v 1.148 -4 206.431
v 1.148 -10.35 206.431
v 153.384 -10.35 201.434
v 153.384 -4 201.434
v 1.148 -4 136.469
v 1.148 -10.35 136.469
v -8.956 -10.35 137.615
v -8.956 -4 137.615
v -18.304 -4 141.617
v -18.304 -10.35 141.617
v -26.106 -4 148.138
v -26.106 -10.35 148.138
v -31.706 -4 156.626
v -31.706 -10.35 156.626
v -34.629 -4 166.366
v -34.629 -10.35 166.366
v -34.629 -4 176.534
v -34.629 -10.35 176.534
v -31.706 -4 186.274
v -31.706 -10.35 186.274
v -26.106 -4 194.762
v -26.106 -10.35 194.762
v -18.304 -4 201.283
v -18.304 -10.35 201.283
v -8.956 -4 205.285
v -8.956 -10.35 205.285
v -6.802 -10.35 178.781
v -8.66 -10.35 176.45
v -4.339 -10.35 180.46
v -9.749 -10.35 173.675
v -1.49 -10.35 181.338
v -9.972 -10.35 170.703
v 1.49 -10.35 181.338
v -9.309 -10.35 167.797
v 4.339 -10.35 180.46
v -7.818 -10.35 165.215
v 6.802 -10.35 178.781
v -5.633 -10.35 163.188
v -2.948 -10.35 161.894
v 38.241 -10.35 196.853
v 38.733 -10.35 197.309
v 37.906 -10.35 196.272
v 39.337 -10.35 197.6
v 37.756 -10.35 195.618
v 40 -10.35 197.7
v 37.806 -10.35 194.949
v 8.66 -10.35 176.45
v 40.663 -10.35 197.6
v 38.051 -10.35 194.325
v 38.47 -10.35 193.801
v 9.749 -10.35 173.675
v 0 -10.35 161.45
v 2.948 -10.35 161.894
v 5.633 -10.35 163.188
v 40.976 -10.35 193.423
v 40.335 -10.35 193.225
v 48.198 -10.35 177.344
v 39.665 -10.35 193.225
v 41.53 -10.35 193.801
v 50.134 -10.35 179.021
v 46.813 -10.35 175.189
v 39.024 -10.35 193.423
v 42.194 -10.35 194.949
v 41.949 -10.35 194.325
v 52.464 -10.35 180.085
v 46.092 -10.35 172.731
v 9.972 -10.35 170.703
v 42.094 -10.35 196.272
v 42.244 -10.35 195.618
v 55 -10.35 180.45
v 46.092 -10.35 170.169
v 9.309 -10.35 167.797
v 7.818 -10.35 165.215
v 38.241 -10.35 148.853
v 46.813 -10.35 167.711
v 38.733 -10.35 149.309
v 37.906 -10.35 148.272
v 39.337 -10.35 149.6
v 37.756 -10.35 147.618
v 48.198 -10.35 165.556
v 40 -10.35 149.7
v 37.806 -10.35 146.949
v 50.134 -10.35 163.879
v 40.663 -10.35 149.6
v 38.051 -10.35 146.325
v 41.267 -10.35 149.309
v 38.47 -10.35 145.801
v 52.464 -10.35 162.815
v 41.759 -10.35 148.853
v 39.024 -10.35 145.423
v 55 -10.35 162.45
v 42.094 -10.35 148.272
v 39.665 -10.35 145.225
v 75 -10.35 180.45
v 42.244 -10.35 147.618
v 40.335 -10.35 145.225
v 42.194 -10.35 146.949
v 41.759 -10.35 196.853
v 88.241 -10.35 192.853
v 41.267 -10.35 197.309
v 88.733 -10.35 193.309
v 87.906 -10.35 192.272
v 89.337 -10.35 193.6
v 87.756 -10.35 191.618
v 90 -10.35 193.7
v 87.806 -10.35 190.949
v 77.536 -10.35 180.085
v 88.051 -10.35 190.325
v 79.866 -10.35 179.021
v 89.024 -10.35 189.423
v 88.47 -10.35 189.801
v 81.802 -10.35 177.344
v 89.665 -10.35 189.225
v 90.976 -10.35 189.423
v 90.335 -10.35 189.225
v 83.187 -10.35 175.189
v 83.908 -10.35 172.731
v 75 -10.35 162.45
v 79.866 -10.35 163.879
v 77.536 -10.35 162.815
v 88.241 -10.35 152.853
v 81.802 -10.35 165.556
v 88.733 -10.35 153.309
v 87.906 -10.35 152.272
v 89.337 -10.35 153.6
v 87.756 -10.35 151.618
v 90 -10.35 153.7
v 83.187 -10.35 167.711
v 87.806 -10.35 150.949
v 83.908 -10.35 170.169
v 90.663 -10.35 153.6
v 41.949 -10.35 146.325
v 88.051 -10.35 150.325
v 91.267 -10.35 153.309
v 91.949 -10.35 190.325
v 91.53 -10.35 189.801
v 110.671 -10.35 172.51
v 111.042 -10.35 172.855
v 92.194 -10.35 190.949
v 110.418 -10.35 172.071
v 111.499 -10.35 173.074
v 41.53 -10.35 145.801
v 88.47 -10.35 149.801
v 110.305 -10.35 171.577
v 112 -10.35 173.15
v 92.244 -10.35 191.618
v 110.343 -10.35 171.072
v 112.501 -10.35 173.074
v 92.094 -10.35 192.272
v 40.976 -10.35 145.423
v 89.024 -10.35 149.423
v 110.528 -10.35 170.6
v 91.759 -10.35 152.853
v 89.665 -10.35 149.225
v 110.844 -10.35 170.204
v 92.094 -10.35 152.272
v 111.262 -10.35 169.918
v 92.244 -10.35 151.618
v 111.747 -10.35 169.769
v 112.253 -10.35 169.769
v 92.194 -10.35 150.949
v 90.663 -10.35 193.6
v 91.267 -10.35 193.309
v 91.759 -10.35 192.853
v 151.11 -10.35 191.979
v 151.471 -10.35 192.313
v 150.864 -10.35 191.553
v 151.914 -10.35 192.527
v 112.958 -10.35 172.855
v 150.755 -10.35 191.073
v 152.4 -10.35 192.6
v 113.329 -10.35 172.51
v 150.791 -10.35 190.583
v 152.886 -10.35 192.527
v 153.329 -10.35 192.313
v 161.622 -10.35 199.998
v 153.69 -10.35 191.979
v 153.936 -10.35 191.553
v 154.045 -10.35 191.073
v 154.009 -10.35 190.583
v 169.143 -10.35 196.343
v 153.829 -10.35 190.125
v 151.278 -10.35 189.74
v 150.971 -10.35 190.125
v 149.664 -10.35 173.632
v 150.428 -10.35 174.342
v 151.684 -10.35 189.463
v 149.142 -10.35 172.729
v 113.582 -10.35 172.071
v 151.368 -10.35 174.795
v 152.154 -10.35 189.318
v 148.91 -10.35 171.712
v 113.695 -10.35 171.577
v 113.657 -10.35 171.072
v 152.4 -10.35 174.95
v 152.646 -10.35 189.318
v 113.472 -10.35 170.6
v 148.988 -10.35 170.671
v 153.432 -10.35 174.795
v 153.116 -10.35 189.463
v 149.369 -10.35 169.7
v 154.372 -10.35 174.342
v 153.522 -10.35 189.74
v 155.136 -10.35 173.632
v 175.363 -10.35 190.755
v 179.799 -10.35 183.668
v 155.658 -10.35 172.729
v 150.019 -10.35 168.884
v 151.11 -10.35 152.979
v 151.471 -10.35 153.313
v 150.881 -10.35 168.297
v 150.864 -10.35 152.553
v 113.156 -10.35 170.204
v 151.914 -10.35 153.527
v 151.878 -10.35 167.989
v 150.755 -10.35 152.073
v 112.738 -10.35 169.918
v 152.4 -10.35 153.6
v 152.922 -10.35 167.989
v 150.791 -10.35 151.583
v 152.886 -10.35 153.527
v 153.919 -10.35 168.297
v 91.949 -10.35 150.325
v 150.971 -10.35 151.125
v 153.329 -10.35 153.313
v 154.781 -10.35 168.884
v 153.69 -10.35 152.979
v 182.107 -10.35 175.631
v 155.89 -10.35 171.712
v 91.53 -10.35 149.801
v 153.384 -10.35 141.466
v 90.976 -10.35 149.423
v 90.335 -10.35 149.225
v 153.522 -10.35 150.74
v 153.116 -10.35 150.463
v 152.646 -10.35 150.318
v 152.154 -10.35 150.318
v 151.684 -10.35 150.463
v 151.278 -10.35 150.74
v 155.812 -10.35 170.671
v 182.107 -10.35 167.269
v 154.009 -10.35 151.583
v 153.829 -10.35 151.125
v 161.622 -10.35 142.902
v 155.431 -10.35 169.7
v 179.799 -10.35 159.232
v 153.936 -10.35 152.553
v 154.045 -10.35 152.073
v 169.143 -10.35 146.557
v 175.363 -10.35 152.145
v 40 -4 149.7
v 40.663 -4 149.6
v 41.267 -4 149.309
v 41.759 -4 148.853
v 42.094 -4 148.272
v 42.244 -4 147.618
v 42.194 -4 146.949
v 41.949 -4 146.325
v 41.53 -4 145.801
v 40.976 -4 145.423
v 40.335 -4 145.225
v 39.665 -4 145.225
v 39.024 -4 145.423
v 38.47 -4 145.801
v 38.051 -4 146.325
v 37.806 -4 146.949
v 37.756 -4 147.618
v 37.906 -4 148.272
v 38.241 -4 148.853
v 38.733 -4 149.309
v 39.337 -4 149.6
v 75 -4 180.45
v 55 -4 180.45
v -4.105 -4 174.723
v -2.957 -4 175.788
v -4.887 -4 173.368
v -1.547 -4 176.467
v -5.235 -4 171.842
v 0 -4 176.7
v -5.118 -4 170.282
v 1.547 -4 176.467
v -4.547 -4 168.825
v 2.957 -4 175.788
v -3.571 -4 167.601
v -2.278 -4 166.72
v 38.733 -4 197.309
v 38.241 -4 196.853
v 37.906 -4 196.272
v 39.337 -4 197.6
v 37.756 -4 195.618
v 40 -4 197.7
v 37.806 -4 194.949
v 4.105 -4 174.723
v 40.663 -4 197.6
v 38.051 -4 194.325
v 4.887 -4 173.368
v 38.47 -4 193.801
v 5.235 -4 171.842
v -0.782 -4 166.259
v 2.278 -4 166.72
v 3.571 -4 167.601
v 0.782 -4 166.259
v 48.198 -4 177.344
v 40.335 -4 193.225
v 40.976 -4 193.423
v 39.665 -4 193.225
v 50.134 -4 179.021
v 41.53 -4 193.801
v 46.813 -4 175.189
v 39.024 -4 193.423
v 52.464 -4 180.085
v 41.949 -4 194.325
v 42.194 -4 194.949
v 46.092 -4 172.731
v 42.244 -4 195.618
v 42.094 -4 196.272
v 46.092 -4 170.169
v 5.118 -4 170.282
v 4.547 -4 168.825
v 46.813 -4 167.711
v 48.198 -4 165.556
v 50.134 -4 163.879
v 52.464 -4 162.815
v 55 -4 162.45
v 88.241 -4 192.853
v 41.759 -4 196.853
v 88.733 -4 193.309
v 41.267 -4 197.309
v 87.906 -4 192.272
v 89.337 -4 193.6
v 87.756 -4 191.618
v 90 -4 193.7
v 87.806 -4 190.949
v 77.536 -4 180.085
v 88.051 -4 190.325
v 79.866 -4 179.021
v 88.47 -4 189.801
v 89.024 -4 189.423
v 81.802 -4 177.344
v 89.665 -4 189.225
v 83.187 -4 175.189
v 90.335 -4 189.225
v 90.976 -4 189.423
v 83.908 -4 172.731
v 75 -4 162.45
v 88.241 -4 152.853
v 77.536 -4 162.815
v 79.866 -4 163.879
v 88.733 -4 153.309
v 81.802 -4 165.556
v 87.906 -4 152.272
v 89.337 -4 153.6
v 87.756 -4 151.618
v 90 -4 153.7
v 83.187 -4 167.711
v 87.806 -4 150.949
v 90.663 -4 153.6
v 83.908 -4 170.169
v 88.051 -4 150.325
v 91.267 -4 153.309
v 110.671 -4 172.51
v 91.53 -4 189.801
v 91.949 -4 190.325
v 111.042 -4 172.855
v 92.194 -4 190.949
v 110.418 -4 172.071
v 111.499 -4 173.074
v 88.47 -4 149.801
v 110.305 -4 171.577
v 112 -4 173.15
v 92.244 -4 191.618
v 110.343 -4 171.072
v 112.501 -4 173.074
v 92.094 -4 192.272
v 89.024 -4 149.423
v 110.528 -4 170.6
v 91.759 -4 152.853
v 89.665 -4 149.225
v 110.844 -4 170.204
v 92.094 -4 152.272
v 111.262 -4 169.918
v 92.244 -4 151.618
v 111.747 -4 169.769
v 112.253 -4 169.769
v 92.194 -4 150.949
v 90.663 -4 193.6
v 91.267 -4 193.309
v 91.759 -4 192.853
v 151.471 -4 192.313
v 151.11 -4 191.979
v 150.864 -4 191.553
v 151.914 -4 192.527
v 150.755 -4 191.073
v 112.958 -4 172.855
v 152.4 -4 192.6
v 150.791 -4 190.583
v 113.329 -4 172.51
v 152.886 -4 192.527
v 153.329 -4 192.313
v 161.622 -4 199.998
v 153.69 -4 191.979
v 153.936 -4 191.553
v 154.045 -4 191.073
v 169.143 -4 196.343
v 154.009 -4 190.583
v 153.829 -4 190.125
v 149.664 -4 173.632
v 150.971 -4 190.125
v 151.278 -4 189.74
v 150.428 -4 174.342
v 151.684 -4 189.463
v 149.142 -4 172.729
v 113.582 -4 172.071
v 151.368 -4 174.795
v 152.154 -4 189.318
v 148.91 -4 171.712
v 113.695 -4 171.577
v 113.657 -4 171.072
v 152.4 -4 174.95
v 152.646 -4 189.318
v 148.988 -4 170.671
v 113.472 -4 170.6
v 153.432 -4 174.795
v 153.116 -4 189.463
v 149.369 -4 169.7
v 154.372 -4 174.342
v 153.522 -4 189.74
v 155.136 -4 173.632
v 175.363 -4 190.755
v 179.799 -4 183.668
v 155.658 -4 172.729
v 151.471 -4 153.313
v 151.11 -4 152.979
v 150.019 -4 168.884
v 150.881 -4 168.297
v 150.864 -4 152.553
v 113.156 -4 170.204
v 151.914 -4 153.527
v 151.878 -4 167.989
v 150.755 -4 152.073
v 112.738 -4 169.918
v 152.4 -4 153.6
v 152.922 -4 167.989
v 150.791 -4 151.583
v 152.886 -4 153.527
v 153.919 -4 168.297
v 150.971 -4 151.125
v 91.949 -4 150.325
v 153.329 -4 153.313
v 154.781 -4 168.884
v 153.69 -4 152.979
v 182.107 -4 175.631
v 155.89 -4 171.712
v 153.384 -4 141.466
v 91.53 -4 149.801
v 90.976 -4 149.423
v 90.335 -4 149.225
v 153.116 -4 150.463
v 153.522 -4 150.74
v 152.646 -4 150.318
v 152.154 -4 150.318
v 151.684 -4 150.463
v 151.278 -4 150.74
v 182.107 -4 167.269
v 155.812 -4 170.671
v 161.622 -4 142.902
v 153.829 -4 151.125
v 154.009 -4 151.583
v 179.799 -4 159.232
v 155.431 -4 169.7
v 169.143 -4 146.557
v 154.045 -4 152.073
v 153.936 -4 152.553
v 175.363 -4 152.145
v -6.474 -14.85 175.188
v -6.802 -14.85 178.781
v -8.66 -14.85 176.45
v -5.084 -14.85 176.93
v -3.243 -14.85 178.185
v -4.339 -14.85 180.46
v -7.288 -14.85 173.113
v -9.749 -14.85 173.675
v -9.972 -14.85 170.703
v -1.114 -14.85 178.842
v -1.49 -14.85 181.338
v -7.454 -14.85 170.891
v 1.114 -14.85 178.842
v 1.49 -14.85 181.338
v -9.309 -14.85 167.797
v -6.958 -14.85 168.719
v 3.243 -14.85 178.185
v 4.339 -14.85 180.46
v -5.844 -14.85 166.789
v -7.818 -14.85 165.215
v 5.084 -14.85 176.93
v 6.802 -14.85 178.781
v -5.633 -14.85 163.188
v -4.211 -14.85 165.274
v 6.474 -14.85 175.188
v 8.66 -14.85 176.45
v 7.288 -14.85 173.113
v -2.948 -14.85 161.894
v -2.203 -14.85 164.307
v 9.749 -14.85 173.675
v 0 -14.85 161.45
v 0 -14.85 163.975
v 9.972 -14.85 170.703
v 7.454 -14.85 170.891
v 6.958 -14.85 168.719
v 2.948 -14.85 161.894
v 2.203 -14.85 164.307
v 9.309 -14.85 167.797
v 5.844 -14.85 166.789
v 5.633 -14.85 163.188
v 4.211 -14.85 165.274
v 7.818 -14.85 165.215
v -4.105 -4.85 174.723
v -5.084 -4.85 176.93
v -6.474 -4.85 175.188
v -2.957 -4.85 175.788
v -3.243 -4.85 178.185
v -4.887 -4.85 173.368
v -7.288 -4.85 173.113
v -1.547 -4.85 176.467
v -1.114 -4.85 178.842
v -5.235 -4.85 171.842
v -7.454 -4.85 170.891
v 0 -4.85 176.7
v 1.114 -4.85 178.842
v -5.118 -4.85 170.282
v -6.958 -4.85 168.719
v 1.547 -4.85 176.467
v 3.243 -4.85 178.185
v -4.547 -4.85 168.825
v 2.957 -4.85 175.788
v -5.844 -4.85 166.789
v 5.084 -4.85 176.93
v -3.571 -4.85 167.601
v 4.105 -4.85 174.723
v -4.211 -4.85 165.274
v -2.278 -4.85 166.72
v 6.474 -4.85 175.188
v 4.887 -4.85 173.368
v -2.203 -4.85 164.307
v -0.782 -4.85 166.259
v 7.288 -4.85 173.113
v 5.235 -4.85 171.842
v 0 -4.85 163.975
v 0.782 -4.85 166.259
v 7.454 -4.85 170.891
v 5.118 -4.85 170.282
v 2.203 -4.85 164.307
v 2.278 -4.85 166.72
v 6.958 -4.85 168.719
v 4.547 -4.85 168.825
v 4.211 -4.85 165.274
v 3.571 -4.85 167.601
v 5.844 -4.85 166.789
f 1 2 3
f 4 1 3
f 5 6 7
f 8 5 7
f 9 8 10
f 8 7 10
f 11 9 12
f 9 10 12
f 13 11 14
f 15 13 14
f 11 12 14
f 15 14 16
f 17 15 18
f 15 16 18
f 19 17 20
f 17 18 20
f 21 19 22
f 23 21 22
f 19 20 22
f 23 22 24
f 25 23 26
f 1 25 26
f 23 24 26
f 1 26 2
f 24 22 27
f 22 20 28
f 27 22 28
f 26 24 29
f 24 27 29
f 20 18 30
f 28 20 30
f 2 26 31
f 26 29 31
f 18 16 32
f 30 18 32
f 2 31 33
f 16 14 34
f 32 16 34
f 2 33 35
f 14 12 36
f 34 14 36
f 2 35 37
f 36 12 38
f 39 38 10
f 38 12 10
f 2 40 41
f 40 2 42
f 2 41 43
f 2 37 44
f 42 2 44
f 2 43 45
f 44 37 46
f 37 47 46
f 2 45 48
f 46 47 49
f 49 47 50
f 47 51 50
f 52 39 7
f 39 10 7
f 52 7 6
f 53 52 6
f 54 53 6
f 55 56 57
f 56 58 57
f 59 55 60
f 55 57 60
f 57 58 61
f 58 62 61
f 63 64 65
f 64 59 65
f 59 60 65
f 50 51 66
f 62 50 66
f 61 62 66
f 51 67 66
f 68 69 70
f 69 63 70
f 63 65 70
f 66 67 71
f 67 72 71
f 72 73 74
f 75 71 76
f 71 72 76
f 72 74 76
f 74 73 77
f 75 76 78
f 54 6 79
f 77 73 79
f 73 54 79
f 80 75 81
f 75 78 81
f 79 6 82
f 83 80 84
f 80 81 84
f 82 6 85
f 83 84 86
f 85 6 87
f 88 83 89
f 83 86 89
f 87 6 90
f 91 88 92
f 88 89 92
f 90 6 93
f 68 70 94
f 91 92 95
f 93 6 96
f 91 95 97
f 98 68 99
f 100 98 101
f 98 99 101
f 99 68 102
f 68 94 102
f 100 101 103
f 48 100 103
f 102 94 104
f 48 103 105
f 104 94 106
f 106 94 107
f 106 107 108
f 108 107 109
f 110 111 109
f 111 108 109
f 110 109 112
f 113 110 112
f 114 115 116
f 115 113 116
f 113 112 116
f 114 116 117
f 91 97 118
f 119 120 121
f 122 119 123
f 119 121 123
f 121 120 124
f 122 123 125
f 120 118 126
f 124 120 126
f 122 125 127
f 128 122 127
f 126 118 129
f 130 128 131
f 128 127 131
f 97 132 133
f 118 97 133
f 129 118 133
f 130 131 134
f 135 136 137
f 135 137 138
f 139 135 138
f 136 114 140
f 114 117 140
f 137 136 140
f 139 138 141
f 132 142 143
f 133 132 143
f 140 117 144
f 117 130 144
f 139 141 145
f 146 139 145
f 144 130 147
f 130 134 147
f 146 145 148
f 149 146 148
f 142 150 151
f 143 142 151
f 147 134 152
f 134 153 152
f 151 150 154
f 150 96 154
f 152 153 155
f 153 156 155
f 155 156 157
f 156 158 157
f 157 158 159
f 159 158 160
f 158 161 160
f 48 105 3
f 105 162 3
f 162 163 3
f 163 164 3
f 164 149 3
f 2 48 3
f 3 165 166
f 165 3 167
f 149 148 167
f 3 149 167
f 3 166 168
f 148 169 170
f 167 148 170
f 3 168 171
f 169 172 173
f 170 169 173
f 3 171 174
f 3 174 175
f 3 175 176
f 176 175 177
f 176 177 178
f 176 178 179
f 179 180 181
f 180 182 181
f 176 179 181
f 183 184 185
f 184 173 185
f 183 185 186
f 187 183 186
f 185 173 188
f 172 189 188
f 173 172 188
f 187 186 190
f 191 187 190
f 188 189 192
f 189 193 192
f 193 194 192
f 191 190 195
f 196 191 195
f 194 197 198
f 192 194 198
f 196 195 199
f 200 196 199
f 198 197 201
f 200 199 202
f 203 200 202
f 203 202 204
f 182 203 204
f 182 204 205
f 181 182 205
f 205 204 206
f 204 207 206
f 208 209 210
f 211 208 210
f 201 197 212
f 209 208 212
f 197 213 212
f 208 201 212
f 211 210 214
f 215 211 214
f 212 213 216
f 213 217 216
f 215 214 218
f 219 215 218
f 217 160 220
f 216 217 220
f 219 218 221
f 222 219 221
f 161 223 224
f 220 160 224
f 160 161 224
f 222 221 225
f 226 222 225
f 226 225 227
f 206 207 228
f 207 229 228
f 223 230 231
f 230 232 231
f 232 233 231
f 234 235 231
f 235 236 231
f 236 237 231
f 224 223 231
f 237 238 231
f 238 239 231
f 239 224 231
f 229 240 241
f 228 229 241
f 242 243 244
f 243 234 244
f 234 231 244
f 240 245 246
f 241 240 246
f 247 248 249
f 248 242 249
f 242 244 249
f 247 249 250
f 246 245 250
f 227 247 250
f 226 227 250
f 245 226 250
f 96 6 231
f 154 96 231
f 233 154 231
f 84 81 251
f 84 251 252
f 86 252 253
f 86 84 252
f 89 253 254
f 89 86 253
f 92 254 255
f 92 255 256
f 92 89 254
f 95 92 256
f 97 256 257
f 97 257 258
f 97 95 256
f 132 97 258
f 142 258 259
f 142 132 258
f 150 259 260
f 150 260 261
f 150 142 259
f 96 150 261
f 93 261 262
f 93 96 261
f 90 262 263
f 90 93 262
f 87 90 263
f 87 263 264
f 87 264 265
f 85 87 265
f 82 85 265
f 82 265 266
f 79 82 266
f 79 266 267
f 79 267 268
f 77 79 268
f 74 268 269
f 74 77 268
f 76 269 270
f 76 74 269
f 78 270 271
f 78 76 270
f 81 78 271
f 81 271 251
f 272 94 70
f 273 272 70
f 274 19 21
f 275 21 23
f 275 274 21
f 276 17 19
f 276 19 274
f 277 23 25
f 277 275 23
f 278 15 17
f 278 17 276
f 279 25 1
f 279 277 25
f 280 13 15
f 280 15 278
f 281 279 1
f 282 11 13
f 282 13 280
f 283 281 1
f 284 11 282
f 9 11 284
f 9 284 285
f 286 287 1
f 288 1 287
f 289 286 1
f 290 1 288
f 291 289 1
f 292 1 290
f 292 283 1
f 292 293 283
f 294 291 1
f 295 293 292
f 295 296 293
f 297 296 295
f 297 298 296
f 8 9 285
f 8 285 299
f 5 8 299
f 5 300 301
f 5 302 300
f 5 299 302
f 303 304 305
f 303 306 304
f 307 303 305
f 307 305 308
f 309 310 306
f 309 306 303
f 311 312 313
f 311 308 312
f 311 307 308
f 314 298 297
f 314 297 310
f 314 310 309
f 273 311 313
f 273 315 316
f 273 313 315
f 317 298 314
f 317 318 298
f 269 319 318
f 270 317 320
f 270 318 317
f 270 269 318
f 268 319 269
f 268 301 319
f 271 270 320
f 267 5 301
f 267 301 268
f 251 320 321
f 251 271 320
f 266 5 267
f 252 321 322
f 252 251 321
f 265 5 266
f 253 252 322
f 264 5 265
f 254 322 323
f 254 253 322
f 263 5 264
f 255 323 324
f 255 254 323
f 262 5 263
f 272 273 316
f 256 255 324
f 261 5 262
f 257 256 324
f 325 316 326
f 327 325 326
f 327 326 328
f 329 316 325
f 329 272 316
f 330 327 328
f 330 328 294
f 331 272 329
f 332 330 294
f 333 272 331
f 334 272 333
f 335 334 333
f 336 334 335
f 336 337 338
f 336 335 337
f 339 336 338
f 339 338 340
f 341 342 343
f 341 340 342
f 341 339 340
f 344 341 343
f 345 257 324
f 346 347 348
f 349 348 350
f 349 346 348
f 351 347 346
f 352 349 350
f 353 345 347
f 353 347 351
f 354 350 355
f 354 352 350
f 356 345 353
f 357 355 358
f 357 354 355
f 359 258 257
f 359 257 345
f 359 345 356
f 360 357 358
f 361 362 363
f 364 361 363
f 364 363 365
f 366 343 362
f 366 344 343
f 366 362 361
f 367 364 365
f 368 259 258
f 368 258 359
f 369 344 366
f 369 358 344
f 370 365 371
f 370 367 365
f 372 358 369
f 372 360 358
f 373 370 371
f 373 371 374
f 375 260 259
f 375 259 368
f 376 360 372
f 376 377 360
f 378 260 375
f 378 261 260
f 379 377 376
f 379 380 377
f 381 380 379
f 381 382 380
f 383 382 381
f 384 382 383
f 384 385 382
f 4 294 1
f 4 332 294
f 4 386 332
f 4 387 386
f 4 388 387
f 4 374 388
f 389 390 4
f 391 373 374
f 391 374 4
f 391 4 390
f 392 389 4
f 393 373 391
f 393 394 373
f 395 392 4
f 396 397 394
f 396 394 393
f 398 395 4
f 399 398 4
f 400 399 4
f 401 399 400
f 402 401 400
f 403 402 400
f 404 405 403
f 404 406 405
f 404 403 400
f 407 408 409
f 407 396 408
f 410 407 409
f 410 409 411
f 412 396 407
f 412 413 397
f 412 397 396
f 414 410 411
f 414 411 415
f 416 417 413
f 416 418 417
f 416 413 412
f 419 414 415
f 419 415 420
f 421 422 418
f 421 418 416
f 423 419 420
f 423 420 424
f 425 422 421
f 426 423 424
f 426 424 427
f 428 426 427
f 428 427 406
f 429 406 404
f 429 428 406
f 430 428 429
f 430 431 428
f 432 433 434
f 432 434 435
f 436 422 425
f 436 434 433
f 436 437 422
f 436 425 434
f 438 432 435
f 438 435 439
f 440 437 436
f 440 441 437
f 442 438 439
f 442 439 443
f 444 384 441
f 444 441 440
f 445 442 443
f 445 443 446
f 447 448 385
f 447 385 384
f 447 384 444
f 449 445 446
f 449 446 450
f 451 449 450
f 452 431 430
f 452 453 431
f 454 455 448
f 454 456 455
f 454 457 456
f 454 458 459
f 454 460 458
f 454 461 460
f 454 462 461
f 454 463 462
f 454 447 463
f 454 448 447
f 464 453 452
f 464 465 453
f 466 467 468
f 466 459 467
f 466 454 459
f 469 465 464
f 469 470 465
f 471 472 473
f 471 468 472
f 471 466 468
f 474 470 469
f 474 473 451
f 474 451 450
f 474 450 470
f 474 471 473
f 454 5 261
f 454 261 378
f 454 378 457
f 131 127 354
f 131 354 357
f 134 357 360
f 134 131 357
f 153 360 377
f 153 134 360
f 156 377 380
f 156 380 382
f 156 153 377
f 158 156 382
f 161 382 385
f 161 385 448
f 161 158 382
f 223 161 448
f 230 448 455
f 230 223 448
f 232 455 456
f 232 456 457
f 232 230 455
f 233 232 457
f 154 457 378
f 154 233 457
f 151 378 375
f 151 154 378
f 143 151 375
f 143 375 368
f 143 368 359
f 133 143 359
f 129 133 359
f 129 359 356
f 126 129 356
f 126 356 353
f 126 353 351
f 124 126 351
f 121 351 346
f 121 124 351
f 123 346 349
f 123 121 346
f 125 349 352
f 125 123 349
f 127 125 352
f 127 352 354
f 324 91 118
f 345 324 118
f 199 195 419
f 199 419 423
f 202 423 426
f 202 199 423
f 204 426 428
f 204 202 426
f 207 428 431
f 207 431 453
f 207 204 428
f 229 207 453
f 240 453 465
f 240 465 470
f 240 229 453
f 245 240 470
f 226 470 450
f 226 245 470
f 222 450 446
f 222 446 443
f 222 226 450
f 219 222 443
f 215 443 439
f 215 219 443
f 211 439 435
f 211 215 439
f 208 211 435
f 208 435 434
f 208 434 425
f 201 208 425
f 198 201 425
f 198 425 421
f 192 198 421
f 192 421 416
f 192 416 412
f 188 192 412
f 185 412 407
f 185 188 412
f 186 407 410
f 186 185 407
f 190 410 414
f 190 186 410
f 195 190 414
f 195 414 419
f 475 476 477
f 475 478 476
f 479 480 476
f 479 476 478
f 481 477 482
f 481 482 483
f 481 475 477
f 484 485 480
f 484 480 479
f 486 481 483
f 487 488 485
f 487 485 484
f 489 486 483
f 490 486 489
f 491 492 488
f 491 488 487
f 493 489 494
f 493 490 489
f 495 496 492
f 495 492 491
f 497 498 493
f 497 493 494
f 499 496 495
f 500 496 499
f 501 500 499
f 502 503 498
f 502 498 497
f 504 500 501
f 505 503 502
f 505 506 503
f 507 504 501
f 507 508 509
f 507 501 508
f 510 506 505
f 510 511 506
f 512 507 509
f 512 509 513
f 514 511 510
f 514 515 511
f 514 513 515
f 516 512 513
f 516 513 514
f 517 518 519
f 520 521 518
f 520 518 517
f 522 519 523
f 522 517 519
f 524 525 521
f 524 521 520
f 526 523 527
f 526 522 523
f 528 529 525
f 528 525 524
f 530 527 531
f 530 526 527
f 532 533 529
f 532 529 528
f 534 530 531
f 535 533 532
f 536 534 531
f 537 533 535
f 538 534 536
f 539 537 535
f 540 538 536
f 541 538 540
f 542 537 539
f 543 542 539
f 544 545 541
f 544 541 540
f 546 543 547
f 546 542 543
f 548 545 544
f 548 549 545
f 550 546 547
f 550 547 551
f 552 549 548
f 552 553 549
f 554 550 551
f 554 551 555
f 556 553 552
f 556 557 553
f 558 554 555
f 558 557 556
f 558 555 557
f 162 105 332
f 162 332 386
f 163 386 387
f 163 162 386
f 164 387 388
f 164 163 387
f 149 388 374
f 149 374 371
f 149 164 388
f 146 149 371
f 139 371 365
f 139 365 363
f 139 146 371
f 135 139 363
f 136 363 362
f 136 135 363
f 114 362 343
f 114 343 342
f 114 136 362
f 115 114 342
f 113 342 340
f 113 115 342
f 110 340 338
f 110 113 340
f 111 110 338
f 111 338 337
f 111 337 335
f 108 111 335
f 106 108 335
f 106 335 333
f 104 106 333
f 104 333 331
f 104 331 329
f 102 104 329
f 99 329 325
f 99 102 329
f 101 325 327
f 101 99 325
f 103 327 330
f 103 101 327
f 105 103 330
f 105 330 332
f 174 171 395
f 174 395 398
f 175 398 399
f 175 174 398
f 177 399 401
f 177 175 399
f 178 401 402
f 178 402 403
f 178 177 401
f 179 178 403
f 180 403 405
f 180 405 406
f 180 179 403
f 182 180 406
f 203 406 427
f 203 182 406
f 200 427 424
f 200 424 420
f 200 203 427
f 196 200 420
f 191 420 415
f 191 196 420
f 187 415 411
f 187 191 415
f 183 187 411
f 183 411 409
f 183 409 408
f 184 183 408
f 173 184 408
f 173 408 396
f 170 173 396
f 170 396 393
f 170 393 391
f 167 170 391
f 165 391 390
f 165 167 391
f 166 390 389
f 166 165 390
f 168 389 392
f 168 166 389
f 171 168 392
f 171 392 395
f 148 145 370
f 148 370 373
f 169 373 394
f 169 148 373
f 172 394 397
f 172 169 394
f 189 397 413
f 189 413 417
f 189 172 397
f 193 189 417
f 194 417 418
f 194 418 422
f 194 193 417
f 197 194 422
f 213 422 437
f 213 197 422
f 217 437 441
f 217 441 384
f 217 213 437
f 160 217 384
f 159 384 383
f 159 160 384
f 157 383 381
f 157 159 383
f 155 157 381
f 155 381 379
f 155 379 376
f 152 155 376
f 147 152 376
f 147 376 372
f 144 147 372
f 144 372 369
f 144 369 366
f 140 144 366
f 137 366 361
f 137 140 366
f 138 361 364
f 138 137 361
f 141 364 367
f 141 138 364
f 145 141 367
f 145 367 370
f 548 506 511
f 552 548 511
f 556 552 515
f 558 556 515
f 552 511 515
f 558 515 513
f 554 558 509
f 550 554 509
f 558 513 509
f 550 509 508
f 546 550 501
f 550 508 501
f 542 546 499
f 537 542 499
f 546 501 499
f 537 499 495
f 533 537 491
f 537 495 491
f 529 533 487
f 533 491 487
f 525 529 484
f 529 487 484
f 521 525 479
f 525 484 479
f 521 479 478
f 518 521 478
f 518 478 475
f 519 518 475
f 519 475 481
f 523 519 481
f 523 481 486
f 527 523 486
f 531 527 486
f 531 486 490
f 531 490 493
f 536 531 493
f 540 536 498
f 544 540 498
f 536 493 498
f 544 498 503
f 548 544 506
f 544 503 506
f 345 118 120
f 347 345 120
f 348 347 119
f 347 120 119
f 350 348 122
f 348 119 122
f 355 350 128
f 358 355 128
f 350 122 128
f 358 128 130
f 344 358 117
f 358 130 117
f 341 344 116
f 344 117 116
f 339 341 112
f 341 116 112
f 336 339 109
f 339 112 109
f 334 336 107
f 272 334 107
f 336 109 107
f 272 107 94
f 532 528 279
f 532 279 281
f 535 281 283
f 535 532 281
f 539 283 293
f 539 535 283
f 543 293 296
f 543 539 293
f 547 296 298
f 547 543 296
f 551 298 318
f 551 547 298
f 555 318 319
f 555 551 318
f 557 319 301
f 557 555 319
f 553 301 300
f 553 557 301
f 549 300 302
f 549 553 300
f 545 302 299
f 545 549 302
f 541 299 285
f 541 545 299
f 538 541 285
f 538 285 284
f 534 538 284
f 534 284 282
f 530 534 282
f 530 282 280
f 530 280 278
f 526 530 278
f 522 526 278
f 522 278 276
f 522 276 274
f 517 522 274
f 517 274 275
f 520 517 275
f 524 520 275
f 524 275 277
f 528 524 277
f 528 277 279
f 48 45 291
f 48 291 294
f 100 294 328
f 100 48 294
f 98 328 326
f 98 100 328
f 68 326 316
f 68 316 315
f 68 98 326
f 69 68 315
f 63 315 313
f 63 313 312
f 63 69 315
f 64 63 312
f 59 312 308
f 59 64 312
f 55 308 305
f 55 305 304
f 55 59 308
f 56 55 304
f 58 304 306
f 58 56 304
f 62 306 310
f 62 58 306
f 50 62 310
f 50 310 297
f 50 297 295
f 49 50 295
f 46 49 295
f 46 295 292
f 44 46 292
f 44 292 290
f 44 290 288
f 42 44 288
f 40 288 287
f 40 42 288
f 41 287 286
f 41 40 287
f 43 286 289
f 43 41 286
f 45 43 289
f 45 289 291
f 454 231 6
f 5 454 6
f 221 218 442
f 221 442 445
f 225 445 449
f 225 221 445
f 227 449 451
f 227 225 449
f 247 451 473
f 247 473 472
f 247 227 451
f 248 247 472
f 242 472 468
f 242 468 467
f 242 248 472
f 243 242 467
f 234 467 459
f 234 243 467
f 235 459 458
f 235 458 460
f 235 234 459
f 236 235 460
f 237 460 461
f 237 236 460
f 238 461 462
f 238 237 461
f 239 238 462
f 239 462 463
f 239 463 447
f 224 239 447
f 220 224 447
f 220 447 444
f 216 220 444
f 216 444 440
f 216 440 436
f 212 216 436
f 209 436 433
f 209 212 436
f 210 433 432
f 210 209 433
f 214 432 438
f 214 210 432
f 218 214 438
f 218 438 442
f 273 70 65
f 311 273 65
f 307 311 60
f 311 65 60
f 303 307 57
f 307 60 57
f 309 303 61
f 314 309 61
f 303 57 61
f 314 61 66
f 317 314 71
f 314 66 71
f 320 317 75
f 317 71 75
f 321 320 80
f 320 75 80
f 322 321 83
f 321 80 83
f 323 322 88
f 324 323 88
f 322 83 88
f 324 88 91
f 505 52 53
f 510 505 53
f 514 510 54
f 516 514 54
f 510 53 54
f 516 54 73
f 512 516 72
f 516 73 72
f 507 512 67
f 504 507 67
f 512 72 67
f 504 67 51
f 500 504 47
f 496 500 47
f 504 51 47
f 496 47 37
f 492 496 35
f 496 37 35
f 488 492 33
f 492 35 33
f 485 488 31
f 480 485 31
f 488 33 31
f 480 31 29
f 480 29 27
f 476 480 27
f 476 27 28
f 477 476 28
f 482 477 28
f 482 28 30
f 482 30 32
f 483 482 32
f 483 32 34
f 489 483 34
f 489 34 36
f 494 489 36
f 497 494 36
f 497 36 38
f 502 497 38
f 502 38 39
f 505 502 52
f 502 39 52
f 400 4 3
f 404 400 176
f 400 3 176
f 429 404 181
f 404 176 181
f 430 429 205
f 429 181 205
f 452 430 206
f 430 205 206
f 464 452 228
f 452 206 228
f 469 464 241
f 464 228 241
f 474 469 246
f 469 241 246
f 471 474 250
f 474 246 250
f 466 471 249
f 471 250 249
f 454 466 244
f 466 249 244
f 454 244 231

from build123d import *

# Parameters (mm, degrees)
PLACA_START                        = -10.35
PLACA_DEPTH                        = 6.35
PLACA_R1_START                     = -10.35
CROQUIS2_R                         = 35
PLACA_R1_DEPTH                     = 6.35
PLACA_R2_START                     = -10.35
CROQUIS3_R                         = 30
PLACA_R2_DEPTH                     = 6.35
ALIGERADO_START                    = -10.35
ALIGERADO_DEPTH                    = 6.35
BARRENOS_SEPARADORES_M4_START      = -10.35
CROQUIS5_R                         = 2.25
BARRENOS_SEPARADORES_M4_DEPTH      = 6.35
PASO_PIN_Y_ROSCA_M4_EJEFALSO_START = -10.35
CROQUIS6_R                         = 5.25
CROQUIS6_R_2                       = 3.5
CROQUIS6_R_3                       = 1.65
PASO_PIN_Y_ROSCA_M4_EJEFALSO_DEPTH = 6.35
ROSCA_M3_BASES_CINCHO_START        = -10.35
CROQUIS7_R                         = 1.25
ROSCA_M3_BASES_CINCHO_DEPTH        = 6.35
PASO_M3_BASES_CINCHO_START         = -10.35
CROQUIS8_R                         = 1.7
PASO_M3_BASES_CINCHO_DEPTH         = 6.35
CROQUIS9_R                         = 10
SALIENTE_EXTRUIR1_DEPTH            = 4.5
CROQUIS10_R                        = 7.475
CORTAR_EXTRUIR1_DEPTH              = 10


with BuildPart() as part:
    # Croquis1 → Placa (new body)
    with BuildSketch(Plane(origin=(0, 0, 0), x_dir=(1, 0, 0), z_dir=(0, 1, 0)).offset(PLACA_START)):
        Polygon((1.148293963, -206.431158085), (153.384251969, -201.433849787), (153.384251969, -141.466150213), (1.148293963, -136.468841915), align=None)
    extrude(amount=PLACA_DEPTH)

    # Croquis2 → Placa_r1 (add)
    with BuildSketch(Plane(origin=(0, 0, 0), x_dir=(1, 0, 0), z_dir=(0, 1, 0)).offset(PLACA_R1_START)):
        with Locations((0, -171.45)):
            Circle(CROQUIS2_R)
    extrude(amount=PLACA_R1_DEPTH)

    # Croquis3 → Placa_r2 (add)
    with BuildSketch(Plane(origin=(0, 0, 0), x_dir=(1, 0, 0), z_dir=(0, 1, 0)).offset(PLACA_R2_START)):
        with Locations((152.4, -171.45)):
            Circle(CROQUIS3_R)
    extrude(amount=PLACA_R2_DEPTH)

    # Croquis4 → Aligerado (cut)
    with BuildSketch(Plane(origin=(0, 0, 0), x_dir=(1, 0, 0), z_dir=(0, 1, 0)).offset(ALIGERADO_START)):
        with BuildLine():
            Line((55, -162.45), (75, -162.45))
            ThreePointArc((75, -162.45), (84, -171.45), (75, -180.45))
            Line((75, -180.45), (55, -180.45))
            ThreePointArc((55, -180.45), (46, -171.45), (55, -162.45))
        make_face()
    extrude(amount=ALIGERADO_DEPTH, mode=Mode.SUBTRACT)

    # Croquis5 → Barrenos_separadores_M4 (cut)
    with BuildSketch(Plane(origin=(0, 0, 0), x_dir=(1, 0, 0), z_dir=(0, 1, 0)).offset(BARRENOS_SEPARADORES_M4_START)):
        with Locations(Location((40, -195.45, 0), (0, 0, 270))):
            Circle(CROQUIS5_R)
        with Locations(Location((40, -147.45, 0), (0, 0, 270))):
            Circle(CROQUIS5_R)
        with Locations(Location((90, -191.45, 0), (0, 0, 270))):
            Circle(CROQUIS5_R)
        with Locations(Location((90, -151.45, 0), (0, 0, 270))):
            Circle(CROQUIS5_R)
    extrude(amount=BARRENOS_SEPARADORES_M4_DEPTH, mode=Mode.SUBTRACT)

    # Croquis6 → Paso_pin_y_rosca_M4_ejefalso (cut)
    with BuildSketch(Plane(origin=(0, 0, 0), x_dir=(1, 0, 0), z_dir=(0, 1, 0)).offset(PASO_PIN_Y_ROSCA_M4_EJEFALSO_START)):
        with Locations(Location((0, -171.45, 0), (0, 0, 270))):
            Circle(CROQUIS6_R)
        with Locations(Location((152.4, -171.45, 0), (0, 0, 270))):
            Circle(CROQUIS6_R_2)
        with Locations(Location((152.4, -190.95, 0), (0, 0, 270))):
            Circle(CROQUIS6_R_3)
        with Locations(Location((152.4, -151.95, 0), (0, 0, 270))):
            Circle(CROQUIS6_R_3)
    extrude(amount=PASO_PIN_Y_ROSCA_M4_EJEFALSO_DEPTH, mode=Mode.SUBTRACT)

    # Croquis7 → Rosca_M3_bases_cincho (cut)
    with BuildSketch(Plane(origin=(0, 0, 0), x_dir=(1, 0, 0), z_dir=(0, 1, 0)).offset(ROSCA_M3_BASES_CINCHO_START)):
        with Locations(Location((112, -171.45, 0), (0, 0, 270))):
            Circle(CROQUIS7_R)
    extrude(amount=ROSCA_M3_BASES_CINCHO_DEPTH, mode=Mode.SUBTRACT)

    # Croquis8 → Paso_M3_bases_cincho (cut)
    with BuildSketch(Plane(origin=(0, 0, 0), x_dir=(1, 0, 0), z_dir=(0, 1, 0)).offset(PASO_M3_BASES_CINCHO_START)):
        with Locations(Location((112, -171.45, 0), (0, 0, 270))):
            Circle(CROQUIS8_R)
    extrude(amount=PASO_M3_BASES_CINCHO_DEPTH, mode=Mode.SUBTRACT)

    # Croquis9 → Saliente-Extruir1 (add)
    with BuildSketch(Plane.XZ.offset(10.35)):
        with Locations(Location((0, 171.45, 0), (0, 0, 270))):
            Circle(CROQUIS9_R)
    extrude(amount=SALIENTE_EXTRUIR1_DEPTH)

    # Croquis10 → Cortar-Extruir1 (cut)
    with BuildSketch(Plane.XZ.offset(14.85)):
        with Locations(Location((0, 171.45, 0), (0, 0, 270))):
            Circle(CROQUIS10_R)
    extrude(amount=-CORTAR_EXTRUIR1_DEPTH, mode=Mode.SUBTRACT)


solid = part.part
